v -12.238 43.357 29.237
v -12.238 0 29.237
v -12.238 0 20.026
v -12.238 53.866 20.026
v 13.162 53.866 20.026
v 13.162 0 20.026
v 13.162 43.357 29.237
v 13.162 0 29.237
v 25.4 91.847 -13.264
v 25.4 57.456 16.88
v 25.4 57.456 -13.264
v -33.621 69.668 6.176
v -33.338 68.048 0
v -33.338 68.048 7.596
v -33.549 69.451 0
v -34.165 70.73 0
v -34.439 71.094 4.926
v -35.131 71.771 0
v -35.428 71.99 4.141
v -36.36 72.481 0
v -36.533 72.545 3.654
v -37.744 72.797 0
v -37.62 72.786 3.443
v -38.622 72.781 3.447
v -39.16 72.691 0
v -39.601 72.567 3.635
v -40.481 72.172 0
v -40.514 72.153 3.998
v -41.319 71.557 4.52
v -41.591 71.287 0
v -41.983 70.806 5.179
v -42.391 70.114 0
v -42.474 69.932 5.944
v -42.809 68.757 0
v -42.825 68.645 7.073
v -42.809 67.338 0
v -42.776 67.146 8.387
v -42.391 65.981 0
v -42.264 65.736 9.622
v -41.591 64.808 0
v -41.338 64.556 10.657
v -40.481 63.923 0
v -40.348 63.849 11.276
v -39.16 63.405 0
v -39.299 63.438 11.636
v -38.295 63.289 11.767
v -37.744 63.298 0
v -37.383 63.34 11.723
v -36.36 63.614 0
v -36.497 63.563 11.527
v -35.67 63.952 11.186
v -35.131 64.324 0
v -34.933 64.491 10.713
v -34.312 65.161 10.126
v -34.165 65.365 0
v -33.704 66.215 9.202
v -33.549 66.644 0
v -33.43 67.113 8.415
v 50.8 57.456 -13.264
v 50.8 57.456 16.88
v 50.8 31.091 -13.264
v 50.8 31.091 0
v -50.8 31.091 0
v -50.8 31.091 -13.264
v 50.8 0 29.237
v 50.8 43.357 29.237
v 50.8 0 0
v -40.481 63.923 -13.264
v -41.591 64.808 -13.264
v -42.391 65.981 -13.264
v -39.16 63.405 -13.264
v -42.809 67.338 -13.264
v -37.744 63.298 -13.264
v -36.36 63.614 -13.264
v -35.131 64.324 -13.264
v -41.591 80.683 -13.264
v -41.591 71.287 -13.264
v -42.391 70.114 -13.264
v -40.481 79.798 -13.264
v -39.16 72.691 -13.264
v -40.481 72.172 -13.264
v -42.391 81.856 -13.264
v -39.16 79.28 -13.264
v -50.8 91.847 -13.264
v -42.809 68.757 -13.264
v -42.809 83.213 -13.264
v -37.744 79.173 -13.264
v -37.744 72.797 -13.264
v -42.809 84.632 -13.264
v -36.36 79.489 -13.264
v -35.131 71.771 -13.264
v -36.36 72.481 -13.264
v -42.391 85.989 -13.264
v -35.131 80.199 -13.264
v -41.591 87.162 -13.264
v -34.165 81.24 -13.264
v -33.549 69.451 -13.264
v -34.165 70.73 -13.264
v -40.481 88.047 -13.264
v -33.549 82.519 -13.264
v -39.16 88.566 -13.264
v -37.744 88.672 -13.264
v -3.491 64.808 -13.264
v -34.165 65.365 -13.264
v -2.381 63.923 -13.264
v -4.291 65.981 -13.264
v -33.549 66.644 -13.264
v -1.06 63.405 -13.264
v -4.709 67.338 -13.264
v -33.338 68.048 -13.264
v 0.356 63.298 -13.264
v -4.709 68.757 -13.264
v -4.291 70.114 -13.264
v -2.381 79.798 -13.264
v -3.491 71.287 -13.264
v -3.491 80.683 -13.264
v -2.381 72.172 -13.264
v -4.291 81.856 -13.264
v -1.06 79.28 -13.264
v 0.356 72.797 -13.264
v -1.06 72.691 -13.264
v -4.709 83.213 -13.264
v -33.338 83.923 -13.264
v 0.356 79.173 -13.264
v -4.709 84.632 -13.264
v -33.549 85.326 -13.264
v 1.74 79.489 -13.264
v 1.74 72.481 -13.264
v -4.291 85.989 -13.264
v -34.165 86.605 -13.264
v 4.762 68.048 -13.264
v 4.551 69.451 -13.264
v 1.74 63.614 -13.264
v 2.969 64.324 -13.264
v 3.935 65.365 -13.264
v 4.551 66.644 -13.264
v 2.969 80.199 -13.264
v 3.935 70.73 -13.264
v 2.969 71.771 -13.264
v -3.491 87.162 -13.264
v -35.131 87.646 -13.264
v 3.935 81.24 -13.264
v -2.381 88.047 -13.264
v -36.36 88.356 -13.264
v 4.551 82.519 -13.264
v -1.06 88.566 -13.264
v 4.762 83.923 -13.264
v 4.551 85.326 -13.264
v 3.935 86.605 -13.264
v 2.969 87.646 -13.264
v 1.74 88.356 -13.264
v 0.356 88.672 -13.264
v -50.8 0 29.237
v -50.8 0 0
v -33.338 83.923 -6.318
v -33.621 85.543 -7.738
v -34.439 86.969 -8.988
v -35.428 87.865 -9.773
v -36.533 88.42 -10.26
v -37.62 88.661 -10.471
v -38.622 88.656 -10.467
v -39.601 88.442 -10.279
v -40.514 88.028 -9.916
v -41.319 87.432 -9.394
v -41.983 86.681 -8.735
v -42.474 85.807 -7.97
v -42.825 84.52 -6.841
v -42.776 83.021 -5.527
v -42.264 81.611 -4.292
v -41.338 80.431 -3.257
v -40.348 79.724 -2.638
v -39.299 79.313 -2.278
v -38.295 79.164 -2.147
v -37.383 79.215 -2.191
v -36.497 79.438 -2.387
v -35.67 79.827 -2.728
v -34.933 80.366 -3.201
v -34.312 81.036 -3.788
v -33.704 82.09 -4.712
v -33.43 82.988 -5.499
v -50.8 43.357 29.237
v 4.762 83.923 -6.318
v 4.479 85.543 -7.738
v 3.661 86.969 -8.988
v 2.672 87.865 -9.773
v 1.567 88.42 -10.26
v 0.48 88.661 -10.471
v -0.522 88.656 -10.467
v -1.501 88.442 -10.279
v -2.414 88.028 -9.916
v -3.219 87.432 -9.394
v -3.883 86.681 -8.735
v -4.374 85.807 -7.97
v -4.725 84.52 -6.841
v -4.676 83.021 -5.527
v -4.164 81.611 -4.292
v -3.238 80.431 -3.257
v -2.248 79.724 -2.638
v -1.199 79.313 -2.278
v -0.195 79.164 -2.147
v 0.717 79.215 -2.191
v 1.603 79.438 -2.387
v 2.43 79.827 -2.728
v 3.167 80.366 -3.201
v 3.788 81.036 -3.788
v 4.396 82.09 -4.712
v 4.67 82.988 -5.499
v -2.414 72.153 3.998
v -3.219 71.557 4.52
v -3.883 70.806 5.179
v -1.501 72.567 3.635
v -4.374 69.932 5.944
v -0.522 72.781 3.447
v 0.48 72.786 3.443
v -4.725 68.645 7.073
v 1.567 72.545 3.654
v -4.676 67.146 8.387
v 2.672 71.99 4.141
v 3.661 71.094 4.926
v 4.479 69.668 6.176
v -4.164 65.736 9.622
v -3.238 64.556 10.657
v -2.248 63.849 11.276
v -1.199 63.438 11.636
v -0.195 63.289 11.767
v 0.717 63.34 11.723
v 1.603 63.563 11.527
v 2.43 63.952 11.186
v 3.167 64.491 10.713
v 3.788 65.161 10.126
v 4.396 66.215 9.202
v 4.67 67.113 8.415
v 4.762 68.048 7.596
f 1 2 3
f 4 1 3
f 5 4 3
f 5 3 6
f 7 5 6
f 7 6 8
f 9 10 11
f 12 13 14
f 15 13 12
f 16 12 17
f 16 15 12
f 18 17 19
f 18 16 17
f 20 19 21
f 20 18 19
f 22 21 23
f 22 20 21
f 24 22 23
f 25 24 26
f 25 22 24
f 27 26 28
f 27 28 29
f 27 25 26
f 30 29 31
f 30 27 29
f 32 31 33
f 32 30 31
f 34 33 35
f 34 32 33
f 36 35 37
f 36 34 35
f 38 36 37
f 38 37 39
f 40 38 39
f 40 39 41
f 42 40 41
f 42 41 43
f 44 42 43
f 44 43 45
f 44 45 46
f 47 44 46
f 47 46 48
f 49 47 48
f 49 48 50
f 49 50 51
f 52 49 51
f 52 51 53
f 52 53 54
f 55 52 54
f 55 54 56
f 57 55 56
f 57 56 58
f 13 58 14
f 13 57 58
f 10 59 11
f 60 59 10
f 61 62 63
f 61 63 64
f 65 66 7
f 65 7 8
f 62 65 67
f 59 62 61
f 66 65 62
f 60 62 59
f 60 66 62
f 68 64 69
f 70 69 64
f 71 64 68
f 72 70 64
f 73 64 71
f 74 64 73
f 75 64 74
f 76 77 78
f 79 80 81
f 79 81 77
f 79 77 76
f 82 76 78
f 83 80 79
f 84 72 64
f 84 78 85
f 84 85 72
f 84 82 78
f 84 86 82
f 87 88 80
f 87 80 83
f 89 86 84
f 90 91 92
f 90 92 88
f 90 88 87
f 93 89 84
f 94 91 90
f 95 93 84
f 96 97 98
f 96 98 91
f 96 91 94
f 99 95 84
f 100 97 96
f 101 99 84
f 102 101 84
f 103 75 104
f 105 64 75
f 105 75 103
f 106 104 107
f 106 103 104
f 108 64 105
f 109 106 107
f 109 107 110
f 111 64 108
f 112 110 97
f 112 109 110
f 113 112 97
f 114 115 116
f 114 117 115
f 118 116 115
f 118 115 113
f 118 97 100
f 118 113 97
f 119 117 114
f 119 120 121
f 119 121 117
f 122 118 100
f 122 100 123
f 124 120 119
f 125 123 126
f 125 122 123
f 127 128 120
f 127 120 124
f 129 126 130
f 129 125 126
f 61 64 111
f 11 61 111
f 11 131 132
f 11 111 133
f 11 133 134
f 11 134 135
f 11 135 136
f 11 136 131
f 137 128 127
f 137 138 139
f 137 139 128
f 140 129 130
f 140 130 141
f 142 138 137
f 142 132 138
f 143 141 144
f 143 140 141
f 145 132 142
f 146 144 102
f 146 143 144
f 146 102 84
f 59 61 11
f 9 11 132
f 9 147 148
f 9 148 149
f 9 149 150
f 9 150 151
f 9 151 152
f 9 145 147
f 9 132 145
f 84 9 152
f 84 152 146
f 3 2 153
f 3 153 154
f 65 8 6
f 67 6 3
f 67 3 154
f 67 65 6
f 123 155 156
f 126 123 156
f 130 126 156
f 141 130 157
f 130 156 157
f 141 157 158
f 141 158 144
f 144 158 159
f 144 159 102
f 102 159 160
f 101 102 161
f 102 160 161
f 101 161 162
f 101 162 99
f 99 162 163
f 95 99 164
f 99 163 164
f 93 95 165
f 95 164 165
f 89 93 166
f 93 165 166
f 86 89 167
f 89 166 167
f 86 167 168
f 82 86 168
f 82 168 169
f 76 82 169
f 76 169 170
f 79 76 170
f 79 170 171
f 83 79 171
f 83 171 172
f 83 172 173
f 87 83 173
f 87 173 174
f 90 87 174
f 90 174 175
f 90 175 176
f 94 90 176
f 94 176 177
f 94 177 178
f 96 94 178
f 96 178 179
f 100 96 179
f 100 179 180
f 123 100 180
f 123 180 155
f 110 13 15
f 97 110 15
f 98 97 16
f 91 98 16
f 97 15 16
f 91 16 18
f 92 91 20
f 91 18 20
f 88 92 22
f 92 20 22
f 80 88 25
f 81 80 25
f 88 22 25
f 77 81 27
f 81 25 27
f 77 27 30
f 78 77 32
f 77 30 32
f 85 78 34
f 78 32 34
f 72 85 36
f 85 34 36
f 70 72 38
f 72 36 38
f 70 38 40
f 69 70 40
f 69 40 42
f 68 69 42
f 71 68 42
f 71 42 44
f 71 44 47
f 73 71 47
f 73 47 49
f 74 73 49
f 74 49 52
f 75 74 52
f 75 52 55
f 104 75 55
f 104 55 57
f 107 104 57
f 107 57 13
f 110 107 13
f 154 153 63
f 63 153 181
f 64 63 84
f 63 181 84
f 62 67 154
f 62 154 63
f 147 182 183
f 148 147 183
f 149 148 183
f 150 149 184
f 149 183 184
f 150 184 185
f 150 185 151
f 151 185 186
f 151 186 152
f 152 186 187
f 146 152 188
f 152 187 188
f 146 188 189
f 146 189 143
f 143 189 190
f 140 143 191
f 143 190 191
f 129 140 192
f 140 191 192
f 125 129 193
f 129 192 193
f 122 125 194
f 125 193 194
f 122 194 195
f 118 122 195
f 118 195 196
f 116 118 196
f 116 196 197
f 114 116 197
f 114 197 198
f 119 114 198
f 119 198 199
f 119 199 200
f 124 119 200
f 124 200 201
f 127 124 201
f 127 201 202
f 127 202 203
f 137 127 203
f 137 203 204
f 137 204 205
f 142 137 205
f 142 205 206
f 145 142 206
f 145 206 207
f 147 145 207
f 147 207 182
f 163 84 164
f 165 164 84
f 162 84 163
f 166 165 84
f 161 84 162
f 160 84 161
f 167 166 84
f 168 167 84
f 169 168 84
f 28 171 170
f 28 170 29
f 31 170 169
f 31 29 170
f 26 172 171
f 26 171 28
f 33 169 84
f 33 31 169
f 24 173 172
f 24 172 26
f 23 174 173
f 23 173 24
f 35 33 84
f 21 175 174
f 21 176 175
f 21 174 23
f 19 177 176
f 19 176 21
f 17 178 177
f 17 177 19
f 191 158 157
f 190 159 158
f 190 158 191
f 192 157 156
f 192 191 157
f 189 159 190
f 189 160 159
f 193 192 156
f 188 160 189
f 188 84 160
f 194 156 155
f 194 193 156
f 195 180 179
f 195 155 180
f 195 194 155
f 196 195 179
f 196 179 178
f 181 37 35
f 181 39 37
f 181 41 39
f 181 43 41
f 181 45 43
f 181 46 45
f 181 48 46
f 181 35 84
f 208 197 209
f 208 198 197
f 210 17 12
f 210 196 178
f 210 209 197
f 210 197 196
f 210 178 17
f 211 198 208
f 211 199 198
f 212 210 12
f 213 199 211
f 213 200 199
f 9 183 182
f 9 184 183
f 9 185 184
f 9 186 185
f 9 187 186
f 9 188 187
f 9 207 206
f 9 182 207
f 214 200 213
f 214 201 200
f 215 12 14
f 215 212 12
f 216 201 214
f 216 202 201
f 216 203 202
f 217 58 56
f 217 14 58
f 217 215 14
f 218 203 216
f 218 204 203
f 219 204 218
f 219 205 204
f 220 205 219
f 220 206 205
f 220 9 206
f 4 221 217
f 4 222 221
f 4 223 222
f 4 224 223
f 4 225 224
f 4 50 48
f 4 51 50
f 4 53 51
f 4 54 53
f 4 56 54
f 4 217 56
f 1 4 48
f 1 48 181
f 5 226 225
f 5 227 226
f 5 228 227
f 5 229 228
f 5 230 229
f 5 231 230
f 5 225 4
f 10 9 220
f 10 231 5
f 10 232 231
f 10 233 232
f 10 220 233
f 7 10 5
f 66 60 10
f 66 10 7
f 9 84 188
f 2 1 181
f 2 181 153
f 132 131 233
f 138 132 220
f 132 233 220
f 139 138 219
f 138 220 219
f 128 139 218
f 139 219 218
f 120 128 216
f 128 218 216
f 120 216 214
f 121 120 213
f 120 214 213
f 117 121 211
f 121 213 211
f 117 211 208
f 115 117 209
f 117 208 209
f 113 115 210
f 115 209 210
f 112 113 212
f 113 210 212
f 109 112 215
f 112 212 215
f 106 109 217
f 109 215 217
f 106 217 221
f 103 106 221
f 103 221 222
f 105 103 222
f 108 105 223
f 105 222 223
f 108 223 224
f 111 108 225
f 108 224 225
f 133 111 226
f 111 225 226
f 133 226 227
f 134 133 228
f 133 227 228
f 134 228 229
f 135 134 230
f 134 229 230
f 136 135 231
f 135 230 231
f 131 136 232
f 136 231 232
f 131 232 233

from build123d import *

# Parameters (mm, degrees)
F1_DEPTH = 50.8
F3_DEPTH = 53.8666486626
F4_W     = 34.3918725848
F4_H     = 43.6418196186
F5_DEPTH = 25.4
F6_R     = 4.7625
F7_DEPTH = 50.8


with BuildPart() as f1:
    # F0 (on Right) → F1 (new body, symmetric)
    with BuildSketch(Plane.YZ):
        Polygon((0, 29.2371641845), (0, 0), (31.0912281275, 0), (31.0912281275, -13.2636902854), (91.8474793434, -13.2636902854), (43.3565787971, 29.2371641845), align=None)
    extrude(amount=F1_DEPTH, both=True)

    # F2 (on face) → F3 (cut, through all)
    with BuildSketch(Plane.XZ):
        Polygon((13.1616968006, 29.2371641845), (0, 29.2371641845), (-12.2383031994, 29.2371641845), (-12.2383031994, 20.0262721628), (13.1616968006, 20.0262721628), align=None)
    extrude(amount=-F3_DEPTH, mode=Mode.SUBTRACT)

    # F4 (on face) → F5 (cut)
    with BuildSketch(Plane.YZ.offset(50.8)):
        with Locations((74.651543051, 8.5572195239)):
            Rectangle(F4_W, F4_H)
    extrude(amount=-F5_DEPTH, mode=Mode.SUBTRACT)

    # F6 (on Top) → F7 (cut, symmetric)
    with BuildSketch(Plane.XY):
        with Locations((-38.1, 83.9226793434)):
            Circle(F6_R)
        with Locations((-38.1, 68.0476793434)):
            Circle(F6_R)
        with Locations((0, 83.9226793434)):
            Circle(F6_R)
        with Locations((0, 68.0476793434)):
            Circle(F6_R)
    extrude(amount=F7_DEPTH, both=True, mode=Mode.SUBTRACT)


solid = f1.part
